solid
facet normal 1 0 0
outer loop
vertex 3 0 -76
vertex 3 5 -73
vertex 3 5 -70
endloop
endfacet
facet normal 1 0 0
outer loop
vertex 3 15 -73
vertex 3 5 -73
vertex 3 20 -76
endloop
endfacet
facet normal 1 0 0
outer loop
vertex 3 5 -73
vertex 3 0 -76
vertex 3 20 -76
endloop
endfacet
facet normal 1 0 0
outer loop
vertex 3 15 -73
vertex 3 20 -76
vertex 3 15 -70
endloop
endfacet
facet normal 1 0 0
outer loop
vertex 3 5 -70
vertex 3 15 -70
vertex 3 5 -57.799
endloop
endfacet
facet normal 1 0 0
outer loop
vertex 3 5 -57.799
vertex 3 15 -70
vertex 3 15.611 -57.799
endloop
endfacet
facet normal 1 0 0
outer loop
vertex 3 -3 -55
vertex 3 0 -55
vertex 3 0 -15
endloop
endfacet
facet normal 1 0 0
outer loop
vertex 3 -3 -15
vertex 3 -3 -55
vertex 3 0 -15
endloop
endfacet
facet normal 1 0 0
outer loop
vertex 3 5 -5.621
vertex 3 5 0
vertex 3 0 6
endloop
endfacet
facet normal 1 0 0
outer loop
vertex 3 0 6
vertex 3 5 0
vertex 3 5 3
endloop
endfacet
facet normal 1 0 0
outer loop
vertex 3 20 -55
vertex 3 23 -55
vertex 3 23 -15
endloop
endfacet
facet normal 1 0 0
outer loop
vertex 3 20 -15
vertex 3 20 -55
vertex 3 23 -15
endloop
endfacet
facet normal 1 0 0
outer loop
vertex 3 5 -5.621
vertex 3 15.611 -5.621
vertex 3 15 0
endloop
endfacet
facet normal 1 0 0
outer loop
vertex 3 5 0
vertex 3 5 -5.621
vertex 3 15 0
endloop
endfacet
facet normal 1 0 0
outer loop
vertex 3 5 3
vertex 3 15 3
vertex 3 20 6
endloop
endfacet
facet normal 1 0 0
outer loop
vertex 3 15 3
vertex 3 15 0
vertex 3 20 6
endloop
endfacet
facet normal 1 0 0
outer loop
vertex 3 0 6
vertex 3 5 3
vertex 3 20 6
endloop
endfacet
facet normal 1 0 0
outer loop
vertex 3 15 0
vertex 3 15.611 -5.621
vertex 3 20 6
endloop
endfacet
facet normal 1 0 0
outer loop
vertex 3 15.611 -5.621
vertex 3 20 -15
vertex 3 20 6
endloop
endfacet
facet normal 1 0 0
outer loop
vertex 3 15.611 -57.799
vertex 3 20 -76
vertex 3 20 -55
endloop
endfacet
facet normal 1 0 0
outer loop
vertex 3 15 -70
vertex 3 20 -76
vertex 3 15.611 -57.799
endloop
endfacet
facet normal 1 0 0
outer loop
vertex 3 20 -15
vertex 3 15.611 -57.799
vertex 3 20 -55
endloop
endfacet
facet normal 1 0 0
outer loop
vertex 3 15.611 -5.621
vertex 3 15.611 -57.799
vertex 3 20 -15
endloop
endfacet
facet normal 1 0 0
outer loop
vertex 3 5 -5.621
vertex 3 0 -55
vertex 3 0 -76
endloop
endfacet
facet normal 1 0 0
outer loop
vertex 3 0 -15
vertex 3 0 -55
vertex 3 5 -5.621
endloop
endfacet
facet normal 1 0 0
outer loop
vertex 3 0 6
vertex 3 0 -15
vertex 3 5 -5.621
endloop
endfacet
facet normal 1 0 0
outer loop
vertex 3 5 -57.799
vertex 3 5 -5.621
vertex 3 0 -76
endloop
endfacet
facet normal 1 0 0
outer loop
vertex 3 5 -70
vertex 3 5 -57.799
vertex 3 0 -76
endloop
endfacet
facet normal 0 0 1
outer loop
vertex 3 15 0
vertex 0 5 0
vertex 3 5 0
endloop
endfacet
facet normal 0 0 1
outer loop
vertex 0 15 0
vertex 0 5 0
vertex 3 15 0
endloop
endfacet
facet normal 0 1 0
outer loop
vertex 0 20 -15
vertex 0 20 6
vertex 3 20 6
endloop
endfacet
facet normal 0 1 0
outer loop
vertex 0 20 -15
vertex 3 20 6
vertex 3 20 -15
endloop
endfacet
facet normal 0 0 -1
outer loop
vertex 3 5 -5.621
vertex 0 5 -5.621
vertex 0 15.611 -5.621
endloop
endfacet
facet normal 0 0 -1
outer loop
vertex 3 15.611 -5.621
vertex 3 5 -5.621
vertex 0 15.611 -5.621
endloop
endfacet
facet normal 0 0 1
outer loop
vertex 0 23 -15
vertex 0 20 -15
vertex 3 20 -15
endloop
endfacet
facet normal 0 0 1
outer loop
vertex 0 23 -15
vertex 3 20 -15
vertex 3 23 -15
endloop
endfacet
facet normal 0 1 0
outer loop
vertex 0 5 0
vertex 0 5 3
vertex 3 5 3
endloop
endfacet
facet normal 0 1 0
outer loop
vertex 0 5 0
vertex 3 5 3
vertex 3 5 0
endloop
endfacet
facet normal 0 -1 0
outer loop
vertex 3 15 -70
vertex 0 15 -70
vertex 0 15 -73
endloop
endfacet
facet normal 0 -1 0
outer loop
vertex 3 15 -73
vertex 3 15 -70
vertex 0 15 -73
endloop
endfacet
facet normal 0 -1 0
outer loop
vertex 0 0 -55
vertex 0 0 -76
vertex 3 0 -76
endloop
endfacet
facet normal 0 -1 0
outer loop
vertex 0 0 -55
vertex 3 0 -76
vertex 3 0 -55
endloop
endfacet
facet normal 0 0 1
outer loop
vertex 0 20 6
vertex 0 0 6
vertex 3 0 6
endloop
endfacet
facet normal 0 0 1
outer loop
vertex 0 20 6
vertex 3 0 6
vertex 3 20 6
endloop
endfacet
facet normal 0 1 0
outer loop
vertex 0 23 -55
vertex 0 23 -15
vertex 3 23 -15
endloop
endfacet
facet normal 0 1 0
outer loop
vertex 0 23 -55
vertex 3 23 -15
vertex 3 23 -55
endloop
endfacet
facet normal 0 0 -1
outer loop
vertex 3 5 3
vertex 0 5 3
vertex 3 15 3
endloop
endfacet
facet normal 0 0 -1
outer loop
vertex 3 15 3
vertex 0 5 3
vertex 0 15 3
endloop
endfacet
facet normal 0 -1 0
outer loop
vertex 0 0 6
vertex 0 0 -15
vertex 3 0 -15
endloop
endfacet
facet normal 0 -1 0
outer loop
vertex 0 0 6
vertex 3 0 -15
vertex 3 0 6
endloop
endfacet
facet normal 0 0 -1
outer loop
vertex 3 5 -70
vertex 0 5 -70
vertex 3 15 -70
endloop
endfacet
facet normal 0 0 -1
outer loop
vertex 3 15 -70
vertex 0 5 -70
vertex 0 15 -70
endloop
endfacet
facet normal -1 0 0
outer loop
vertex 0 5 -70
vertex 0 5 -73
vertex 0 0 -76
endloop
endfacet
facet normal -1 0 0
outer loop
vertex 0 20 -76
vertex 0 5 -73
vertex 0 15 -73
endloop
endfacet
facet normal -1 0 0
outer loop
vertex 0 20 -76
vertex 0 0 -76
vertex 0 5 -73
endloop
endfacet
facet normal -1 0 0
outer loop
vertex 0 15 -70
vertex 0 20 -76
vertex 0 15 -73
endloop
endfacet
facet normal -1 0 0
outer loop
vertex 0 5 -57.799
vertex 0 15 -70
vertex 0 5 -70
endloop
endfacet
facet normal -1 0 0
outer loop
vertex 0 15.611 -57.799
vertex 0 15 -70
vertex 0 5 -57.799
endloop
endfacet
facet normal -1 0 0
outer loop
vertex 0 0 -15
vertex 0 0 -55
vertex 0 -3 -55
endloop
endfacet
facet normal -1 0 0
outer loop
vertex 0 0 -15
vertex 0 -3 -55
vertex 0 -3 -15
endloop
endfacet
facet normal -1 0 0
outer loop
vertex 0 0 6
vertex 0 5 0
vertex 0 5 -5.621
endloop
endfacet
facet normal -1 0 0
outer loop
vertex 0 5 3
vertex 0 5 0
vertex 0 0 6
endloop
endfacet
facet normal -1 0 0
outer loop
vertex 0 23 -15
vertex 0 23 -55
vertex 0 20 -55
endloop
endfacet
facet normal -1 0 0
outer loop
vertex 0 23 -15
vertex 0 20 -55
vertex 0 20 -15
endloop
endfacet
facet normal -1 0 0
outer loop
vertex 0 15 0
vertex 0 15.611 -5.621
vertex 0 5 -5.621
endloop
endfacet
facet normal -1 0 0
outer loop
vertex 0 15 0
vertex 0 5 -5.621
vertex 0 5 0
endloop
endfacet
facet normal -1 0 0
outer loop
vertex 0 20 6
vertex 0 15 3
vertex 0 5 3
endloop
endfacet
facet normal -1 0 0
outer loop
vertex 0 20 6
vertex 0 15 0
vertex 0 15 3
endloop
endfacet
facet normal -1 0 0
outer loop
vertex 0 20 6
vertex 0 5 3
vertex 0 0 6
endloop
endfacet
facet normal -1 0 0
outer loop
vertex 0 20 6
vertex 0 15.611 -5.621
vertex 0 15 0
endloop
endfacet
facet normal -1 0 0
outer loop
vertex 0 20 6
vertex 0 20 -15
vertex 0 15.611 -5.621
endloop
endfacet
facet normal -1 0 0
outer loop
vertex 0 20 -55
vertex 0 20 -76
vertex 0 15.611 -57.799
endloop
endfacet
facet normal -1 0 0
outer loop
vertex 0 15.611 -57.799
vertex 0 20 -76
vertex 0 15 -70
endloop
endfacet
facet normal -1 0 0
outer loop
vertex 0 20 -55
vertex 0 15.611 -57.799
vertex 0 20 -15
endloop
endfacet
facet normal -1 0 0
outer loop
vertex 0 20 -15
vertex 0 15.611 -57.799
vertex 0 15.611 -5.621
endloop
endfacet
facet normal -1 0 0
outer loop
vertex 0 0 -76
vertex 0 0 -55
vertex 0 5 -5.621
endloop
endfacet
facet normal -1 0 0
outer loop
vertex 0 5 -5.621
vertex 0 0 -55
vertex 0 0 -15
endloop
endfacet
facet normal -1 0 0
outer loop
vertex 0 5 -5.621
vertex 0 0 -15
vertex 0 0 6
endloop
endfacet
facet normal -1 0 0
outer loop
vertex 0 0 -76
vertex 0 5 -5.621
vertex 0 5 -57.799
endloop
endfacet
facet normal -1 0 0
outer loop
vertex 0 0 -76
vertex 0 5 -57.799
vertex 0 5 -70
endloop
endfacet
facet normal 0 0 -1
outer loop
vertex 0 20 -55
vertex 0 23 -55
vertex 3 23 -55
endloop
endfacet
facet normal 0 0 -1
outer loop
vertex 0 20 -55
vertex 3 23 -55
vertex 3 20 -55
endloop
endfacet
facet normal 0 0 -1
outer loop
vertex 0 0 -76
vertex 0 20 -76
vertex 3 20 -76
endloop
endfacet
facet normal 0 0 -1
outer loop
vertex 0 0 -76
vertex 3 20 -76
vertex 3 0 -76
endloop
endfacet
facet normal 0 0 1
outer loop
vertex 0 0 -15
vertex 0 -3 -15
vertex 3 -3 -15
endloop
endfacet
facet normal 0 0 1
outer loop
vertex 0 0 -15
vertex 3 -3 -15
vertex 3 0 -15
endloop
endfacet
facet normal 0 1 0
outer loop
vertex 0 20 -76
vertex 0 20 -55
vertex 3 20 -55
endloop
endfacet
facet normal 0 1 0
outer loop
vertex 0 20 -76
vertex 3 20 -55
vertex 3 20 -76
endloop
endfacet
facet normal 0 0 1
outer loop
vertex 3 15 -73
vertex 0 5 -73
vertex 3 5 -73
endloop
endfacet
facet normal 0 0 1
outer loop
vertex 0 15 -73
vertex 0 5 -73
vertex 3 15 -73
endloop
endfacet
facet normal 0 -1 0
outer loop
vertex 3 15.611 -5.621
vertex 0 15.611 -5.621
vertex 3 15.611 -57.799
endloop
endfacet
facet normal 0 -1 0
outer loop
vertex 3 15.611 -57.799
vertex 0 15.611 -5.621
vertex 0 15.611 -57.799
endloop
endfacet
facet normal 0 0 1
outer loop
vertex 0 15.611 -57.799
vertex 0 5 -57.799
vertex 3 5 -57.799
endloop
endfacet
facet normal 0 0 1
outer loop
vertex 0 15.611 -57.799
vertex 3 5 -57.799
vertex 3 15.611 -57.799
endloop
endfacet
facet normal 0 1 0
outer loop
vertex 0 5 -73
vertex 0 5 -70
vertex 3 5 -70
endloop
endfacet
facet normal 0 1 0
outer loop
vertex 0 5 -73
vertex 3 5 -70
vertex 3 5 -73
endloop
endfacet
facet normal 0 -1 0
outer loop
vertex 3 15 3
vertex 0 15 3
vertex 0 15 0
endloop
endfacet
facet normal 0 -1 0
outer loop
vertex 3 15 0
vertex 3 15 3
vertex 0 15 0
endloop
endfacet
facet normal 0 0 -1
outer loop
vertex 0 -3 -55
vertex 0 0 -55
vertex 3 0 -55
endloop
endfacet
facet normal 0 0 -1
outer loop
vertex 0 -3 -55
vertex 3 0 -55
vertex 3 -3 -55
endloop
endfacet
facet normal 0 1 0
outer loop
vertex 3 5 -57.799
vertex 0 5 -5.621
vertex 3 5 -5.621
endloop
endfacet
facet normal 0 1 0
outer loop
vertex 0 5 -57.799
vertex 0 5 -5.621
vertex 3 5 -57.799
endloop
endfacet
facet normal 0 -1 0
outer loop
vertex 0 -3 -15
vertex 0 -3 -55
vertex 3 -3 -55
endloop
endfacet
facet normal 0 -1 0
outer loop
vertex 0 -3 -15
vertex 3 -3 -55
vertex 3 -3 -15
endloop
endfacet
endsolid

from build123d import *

# Parameters (mm, degrees)
SKETCH1_W           = 3
SKETCH1_H           = 10
SKETCH1_W_2         = 52.177317389
SKETCH1_H_2         = 10.6108985
BOSS_EXTRUDE1_DEPTH = 3


with BuildPart() as part:
    # Sketch1 → Boss-Extrude1 (new body)
    with BuildSketch(Plane(origin=(0, 0, 0), x_dir=(0, 0, -1), z_dir=(1, 0, 0))):
        Polygon((-6, 0), (-6, 20), (15, 20), (15, 23), (55, 23), (55, 20), (76, 20), (76, 0), (55, 0), (55, -3), (15, -3), (15, 0), align=None)
        with Locations((-1.5, 10)):
            Rectangle(SKETCH1_W, SKETCH1_H, mode=Mode.SUBTRACT)
        with Locations((71.5, 10)):
            Rectangle(SKETCH1_W, SKETCH1_H, mode=Mode.SUBTRACT)
        with Locations((31.710045475, 10.30544925)):
            Rectangle(SKETCH1_W_2, SKETCH1_H_2, mode=Mode.SUBTRACT)
    extrude(amount=BOSS_EXTRUDE1_DEPTH)


solid = part.part
